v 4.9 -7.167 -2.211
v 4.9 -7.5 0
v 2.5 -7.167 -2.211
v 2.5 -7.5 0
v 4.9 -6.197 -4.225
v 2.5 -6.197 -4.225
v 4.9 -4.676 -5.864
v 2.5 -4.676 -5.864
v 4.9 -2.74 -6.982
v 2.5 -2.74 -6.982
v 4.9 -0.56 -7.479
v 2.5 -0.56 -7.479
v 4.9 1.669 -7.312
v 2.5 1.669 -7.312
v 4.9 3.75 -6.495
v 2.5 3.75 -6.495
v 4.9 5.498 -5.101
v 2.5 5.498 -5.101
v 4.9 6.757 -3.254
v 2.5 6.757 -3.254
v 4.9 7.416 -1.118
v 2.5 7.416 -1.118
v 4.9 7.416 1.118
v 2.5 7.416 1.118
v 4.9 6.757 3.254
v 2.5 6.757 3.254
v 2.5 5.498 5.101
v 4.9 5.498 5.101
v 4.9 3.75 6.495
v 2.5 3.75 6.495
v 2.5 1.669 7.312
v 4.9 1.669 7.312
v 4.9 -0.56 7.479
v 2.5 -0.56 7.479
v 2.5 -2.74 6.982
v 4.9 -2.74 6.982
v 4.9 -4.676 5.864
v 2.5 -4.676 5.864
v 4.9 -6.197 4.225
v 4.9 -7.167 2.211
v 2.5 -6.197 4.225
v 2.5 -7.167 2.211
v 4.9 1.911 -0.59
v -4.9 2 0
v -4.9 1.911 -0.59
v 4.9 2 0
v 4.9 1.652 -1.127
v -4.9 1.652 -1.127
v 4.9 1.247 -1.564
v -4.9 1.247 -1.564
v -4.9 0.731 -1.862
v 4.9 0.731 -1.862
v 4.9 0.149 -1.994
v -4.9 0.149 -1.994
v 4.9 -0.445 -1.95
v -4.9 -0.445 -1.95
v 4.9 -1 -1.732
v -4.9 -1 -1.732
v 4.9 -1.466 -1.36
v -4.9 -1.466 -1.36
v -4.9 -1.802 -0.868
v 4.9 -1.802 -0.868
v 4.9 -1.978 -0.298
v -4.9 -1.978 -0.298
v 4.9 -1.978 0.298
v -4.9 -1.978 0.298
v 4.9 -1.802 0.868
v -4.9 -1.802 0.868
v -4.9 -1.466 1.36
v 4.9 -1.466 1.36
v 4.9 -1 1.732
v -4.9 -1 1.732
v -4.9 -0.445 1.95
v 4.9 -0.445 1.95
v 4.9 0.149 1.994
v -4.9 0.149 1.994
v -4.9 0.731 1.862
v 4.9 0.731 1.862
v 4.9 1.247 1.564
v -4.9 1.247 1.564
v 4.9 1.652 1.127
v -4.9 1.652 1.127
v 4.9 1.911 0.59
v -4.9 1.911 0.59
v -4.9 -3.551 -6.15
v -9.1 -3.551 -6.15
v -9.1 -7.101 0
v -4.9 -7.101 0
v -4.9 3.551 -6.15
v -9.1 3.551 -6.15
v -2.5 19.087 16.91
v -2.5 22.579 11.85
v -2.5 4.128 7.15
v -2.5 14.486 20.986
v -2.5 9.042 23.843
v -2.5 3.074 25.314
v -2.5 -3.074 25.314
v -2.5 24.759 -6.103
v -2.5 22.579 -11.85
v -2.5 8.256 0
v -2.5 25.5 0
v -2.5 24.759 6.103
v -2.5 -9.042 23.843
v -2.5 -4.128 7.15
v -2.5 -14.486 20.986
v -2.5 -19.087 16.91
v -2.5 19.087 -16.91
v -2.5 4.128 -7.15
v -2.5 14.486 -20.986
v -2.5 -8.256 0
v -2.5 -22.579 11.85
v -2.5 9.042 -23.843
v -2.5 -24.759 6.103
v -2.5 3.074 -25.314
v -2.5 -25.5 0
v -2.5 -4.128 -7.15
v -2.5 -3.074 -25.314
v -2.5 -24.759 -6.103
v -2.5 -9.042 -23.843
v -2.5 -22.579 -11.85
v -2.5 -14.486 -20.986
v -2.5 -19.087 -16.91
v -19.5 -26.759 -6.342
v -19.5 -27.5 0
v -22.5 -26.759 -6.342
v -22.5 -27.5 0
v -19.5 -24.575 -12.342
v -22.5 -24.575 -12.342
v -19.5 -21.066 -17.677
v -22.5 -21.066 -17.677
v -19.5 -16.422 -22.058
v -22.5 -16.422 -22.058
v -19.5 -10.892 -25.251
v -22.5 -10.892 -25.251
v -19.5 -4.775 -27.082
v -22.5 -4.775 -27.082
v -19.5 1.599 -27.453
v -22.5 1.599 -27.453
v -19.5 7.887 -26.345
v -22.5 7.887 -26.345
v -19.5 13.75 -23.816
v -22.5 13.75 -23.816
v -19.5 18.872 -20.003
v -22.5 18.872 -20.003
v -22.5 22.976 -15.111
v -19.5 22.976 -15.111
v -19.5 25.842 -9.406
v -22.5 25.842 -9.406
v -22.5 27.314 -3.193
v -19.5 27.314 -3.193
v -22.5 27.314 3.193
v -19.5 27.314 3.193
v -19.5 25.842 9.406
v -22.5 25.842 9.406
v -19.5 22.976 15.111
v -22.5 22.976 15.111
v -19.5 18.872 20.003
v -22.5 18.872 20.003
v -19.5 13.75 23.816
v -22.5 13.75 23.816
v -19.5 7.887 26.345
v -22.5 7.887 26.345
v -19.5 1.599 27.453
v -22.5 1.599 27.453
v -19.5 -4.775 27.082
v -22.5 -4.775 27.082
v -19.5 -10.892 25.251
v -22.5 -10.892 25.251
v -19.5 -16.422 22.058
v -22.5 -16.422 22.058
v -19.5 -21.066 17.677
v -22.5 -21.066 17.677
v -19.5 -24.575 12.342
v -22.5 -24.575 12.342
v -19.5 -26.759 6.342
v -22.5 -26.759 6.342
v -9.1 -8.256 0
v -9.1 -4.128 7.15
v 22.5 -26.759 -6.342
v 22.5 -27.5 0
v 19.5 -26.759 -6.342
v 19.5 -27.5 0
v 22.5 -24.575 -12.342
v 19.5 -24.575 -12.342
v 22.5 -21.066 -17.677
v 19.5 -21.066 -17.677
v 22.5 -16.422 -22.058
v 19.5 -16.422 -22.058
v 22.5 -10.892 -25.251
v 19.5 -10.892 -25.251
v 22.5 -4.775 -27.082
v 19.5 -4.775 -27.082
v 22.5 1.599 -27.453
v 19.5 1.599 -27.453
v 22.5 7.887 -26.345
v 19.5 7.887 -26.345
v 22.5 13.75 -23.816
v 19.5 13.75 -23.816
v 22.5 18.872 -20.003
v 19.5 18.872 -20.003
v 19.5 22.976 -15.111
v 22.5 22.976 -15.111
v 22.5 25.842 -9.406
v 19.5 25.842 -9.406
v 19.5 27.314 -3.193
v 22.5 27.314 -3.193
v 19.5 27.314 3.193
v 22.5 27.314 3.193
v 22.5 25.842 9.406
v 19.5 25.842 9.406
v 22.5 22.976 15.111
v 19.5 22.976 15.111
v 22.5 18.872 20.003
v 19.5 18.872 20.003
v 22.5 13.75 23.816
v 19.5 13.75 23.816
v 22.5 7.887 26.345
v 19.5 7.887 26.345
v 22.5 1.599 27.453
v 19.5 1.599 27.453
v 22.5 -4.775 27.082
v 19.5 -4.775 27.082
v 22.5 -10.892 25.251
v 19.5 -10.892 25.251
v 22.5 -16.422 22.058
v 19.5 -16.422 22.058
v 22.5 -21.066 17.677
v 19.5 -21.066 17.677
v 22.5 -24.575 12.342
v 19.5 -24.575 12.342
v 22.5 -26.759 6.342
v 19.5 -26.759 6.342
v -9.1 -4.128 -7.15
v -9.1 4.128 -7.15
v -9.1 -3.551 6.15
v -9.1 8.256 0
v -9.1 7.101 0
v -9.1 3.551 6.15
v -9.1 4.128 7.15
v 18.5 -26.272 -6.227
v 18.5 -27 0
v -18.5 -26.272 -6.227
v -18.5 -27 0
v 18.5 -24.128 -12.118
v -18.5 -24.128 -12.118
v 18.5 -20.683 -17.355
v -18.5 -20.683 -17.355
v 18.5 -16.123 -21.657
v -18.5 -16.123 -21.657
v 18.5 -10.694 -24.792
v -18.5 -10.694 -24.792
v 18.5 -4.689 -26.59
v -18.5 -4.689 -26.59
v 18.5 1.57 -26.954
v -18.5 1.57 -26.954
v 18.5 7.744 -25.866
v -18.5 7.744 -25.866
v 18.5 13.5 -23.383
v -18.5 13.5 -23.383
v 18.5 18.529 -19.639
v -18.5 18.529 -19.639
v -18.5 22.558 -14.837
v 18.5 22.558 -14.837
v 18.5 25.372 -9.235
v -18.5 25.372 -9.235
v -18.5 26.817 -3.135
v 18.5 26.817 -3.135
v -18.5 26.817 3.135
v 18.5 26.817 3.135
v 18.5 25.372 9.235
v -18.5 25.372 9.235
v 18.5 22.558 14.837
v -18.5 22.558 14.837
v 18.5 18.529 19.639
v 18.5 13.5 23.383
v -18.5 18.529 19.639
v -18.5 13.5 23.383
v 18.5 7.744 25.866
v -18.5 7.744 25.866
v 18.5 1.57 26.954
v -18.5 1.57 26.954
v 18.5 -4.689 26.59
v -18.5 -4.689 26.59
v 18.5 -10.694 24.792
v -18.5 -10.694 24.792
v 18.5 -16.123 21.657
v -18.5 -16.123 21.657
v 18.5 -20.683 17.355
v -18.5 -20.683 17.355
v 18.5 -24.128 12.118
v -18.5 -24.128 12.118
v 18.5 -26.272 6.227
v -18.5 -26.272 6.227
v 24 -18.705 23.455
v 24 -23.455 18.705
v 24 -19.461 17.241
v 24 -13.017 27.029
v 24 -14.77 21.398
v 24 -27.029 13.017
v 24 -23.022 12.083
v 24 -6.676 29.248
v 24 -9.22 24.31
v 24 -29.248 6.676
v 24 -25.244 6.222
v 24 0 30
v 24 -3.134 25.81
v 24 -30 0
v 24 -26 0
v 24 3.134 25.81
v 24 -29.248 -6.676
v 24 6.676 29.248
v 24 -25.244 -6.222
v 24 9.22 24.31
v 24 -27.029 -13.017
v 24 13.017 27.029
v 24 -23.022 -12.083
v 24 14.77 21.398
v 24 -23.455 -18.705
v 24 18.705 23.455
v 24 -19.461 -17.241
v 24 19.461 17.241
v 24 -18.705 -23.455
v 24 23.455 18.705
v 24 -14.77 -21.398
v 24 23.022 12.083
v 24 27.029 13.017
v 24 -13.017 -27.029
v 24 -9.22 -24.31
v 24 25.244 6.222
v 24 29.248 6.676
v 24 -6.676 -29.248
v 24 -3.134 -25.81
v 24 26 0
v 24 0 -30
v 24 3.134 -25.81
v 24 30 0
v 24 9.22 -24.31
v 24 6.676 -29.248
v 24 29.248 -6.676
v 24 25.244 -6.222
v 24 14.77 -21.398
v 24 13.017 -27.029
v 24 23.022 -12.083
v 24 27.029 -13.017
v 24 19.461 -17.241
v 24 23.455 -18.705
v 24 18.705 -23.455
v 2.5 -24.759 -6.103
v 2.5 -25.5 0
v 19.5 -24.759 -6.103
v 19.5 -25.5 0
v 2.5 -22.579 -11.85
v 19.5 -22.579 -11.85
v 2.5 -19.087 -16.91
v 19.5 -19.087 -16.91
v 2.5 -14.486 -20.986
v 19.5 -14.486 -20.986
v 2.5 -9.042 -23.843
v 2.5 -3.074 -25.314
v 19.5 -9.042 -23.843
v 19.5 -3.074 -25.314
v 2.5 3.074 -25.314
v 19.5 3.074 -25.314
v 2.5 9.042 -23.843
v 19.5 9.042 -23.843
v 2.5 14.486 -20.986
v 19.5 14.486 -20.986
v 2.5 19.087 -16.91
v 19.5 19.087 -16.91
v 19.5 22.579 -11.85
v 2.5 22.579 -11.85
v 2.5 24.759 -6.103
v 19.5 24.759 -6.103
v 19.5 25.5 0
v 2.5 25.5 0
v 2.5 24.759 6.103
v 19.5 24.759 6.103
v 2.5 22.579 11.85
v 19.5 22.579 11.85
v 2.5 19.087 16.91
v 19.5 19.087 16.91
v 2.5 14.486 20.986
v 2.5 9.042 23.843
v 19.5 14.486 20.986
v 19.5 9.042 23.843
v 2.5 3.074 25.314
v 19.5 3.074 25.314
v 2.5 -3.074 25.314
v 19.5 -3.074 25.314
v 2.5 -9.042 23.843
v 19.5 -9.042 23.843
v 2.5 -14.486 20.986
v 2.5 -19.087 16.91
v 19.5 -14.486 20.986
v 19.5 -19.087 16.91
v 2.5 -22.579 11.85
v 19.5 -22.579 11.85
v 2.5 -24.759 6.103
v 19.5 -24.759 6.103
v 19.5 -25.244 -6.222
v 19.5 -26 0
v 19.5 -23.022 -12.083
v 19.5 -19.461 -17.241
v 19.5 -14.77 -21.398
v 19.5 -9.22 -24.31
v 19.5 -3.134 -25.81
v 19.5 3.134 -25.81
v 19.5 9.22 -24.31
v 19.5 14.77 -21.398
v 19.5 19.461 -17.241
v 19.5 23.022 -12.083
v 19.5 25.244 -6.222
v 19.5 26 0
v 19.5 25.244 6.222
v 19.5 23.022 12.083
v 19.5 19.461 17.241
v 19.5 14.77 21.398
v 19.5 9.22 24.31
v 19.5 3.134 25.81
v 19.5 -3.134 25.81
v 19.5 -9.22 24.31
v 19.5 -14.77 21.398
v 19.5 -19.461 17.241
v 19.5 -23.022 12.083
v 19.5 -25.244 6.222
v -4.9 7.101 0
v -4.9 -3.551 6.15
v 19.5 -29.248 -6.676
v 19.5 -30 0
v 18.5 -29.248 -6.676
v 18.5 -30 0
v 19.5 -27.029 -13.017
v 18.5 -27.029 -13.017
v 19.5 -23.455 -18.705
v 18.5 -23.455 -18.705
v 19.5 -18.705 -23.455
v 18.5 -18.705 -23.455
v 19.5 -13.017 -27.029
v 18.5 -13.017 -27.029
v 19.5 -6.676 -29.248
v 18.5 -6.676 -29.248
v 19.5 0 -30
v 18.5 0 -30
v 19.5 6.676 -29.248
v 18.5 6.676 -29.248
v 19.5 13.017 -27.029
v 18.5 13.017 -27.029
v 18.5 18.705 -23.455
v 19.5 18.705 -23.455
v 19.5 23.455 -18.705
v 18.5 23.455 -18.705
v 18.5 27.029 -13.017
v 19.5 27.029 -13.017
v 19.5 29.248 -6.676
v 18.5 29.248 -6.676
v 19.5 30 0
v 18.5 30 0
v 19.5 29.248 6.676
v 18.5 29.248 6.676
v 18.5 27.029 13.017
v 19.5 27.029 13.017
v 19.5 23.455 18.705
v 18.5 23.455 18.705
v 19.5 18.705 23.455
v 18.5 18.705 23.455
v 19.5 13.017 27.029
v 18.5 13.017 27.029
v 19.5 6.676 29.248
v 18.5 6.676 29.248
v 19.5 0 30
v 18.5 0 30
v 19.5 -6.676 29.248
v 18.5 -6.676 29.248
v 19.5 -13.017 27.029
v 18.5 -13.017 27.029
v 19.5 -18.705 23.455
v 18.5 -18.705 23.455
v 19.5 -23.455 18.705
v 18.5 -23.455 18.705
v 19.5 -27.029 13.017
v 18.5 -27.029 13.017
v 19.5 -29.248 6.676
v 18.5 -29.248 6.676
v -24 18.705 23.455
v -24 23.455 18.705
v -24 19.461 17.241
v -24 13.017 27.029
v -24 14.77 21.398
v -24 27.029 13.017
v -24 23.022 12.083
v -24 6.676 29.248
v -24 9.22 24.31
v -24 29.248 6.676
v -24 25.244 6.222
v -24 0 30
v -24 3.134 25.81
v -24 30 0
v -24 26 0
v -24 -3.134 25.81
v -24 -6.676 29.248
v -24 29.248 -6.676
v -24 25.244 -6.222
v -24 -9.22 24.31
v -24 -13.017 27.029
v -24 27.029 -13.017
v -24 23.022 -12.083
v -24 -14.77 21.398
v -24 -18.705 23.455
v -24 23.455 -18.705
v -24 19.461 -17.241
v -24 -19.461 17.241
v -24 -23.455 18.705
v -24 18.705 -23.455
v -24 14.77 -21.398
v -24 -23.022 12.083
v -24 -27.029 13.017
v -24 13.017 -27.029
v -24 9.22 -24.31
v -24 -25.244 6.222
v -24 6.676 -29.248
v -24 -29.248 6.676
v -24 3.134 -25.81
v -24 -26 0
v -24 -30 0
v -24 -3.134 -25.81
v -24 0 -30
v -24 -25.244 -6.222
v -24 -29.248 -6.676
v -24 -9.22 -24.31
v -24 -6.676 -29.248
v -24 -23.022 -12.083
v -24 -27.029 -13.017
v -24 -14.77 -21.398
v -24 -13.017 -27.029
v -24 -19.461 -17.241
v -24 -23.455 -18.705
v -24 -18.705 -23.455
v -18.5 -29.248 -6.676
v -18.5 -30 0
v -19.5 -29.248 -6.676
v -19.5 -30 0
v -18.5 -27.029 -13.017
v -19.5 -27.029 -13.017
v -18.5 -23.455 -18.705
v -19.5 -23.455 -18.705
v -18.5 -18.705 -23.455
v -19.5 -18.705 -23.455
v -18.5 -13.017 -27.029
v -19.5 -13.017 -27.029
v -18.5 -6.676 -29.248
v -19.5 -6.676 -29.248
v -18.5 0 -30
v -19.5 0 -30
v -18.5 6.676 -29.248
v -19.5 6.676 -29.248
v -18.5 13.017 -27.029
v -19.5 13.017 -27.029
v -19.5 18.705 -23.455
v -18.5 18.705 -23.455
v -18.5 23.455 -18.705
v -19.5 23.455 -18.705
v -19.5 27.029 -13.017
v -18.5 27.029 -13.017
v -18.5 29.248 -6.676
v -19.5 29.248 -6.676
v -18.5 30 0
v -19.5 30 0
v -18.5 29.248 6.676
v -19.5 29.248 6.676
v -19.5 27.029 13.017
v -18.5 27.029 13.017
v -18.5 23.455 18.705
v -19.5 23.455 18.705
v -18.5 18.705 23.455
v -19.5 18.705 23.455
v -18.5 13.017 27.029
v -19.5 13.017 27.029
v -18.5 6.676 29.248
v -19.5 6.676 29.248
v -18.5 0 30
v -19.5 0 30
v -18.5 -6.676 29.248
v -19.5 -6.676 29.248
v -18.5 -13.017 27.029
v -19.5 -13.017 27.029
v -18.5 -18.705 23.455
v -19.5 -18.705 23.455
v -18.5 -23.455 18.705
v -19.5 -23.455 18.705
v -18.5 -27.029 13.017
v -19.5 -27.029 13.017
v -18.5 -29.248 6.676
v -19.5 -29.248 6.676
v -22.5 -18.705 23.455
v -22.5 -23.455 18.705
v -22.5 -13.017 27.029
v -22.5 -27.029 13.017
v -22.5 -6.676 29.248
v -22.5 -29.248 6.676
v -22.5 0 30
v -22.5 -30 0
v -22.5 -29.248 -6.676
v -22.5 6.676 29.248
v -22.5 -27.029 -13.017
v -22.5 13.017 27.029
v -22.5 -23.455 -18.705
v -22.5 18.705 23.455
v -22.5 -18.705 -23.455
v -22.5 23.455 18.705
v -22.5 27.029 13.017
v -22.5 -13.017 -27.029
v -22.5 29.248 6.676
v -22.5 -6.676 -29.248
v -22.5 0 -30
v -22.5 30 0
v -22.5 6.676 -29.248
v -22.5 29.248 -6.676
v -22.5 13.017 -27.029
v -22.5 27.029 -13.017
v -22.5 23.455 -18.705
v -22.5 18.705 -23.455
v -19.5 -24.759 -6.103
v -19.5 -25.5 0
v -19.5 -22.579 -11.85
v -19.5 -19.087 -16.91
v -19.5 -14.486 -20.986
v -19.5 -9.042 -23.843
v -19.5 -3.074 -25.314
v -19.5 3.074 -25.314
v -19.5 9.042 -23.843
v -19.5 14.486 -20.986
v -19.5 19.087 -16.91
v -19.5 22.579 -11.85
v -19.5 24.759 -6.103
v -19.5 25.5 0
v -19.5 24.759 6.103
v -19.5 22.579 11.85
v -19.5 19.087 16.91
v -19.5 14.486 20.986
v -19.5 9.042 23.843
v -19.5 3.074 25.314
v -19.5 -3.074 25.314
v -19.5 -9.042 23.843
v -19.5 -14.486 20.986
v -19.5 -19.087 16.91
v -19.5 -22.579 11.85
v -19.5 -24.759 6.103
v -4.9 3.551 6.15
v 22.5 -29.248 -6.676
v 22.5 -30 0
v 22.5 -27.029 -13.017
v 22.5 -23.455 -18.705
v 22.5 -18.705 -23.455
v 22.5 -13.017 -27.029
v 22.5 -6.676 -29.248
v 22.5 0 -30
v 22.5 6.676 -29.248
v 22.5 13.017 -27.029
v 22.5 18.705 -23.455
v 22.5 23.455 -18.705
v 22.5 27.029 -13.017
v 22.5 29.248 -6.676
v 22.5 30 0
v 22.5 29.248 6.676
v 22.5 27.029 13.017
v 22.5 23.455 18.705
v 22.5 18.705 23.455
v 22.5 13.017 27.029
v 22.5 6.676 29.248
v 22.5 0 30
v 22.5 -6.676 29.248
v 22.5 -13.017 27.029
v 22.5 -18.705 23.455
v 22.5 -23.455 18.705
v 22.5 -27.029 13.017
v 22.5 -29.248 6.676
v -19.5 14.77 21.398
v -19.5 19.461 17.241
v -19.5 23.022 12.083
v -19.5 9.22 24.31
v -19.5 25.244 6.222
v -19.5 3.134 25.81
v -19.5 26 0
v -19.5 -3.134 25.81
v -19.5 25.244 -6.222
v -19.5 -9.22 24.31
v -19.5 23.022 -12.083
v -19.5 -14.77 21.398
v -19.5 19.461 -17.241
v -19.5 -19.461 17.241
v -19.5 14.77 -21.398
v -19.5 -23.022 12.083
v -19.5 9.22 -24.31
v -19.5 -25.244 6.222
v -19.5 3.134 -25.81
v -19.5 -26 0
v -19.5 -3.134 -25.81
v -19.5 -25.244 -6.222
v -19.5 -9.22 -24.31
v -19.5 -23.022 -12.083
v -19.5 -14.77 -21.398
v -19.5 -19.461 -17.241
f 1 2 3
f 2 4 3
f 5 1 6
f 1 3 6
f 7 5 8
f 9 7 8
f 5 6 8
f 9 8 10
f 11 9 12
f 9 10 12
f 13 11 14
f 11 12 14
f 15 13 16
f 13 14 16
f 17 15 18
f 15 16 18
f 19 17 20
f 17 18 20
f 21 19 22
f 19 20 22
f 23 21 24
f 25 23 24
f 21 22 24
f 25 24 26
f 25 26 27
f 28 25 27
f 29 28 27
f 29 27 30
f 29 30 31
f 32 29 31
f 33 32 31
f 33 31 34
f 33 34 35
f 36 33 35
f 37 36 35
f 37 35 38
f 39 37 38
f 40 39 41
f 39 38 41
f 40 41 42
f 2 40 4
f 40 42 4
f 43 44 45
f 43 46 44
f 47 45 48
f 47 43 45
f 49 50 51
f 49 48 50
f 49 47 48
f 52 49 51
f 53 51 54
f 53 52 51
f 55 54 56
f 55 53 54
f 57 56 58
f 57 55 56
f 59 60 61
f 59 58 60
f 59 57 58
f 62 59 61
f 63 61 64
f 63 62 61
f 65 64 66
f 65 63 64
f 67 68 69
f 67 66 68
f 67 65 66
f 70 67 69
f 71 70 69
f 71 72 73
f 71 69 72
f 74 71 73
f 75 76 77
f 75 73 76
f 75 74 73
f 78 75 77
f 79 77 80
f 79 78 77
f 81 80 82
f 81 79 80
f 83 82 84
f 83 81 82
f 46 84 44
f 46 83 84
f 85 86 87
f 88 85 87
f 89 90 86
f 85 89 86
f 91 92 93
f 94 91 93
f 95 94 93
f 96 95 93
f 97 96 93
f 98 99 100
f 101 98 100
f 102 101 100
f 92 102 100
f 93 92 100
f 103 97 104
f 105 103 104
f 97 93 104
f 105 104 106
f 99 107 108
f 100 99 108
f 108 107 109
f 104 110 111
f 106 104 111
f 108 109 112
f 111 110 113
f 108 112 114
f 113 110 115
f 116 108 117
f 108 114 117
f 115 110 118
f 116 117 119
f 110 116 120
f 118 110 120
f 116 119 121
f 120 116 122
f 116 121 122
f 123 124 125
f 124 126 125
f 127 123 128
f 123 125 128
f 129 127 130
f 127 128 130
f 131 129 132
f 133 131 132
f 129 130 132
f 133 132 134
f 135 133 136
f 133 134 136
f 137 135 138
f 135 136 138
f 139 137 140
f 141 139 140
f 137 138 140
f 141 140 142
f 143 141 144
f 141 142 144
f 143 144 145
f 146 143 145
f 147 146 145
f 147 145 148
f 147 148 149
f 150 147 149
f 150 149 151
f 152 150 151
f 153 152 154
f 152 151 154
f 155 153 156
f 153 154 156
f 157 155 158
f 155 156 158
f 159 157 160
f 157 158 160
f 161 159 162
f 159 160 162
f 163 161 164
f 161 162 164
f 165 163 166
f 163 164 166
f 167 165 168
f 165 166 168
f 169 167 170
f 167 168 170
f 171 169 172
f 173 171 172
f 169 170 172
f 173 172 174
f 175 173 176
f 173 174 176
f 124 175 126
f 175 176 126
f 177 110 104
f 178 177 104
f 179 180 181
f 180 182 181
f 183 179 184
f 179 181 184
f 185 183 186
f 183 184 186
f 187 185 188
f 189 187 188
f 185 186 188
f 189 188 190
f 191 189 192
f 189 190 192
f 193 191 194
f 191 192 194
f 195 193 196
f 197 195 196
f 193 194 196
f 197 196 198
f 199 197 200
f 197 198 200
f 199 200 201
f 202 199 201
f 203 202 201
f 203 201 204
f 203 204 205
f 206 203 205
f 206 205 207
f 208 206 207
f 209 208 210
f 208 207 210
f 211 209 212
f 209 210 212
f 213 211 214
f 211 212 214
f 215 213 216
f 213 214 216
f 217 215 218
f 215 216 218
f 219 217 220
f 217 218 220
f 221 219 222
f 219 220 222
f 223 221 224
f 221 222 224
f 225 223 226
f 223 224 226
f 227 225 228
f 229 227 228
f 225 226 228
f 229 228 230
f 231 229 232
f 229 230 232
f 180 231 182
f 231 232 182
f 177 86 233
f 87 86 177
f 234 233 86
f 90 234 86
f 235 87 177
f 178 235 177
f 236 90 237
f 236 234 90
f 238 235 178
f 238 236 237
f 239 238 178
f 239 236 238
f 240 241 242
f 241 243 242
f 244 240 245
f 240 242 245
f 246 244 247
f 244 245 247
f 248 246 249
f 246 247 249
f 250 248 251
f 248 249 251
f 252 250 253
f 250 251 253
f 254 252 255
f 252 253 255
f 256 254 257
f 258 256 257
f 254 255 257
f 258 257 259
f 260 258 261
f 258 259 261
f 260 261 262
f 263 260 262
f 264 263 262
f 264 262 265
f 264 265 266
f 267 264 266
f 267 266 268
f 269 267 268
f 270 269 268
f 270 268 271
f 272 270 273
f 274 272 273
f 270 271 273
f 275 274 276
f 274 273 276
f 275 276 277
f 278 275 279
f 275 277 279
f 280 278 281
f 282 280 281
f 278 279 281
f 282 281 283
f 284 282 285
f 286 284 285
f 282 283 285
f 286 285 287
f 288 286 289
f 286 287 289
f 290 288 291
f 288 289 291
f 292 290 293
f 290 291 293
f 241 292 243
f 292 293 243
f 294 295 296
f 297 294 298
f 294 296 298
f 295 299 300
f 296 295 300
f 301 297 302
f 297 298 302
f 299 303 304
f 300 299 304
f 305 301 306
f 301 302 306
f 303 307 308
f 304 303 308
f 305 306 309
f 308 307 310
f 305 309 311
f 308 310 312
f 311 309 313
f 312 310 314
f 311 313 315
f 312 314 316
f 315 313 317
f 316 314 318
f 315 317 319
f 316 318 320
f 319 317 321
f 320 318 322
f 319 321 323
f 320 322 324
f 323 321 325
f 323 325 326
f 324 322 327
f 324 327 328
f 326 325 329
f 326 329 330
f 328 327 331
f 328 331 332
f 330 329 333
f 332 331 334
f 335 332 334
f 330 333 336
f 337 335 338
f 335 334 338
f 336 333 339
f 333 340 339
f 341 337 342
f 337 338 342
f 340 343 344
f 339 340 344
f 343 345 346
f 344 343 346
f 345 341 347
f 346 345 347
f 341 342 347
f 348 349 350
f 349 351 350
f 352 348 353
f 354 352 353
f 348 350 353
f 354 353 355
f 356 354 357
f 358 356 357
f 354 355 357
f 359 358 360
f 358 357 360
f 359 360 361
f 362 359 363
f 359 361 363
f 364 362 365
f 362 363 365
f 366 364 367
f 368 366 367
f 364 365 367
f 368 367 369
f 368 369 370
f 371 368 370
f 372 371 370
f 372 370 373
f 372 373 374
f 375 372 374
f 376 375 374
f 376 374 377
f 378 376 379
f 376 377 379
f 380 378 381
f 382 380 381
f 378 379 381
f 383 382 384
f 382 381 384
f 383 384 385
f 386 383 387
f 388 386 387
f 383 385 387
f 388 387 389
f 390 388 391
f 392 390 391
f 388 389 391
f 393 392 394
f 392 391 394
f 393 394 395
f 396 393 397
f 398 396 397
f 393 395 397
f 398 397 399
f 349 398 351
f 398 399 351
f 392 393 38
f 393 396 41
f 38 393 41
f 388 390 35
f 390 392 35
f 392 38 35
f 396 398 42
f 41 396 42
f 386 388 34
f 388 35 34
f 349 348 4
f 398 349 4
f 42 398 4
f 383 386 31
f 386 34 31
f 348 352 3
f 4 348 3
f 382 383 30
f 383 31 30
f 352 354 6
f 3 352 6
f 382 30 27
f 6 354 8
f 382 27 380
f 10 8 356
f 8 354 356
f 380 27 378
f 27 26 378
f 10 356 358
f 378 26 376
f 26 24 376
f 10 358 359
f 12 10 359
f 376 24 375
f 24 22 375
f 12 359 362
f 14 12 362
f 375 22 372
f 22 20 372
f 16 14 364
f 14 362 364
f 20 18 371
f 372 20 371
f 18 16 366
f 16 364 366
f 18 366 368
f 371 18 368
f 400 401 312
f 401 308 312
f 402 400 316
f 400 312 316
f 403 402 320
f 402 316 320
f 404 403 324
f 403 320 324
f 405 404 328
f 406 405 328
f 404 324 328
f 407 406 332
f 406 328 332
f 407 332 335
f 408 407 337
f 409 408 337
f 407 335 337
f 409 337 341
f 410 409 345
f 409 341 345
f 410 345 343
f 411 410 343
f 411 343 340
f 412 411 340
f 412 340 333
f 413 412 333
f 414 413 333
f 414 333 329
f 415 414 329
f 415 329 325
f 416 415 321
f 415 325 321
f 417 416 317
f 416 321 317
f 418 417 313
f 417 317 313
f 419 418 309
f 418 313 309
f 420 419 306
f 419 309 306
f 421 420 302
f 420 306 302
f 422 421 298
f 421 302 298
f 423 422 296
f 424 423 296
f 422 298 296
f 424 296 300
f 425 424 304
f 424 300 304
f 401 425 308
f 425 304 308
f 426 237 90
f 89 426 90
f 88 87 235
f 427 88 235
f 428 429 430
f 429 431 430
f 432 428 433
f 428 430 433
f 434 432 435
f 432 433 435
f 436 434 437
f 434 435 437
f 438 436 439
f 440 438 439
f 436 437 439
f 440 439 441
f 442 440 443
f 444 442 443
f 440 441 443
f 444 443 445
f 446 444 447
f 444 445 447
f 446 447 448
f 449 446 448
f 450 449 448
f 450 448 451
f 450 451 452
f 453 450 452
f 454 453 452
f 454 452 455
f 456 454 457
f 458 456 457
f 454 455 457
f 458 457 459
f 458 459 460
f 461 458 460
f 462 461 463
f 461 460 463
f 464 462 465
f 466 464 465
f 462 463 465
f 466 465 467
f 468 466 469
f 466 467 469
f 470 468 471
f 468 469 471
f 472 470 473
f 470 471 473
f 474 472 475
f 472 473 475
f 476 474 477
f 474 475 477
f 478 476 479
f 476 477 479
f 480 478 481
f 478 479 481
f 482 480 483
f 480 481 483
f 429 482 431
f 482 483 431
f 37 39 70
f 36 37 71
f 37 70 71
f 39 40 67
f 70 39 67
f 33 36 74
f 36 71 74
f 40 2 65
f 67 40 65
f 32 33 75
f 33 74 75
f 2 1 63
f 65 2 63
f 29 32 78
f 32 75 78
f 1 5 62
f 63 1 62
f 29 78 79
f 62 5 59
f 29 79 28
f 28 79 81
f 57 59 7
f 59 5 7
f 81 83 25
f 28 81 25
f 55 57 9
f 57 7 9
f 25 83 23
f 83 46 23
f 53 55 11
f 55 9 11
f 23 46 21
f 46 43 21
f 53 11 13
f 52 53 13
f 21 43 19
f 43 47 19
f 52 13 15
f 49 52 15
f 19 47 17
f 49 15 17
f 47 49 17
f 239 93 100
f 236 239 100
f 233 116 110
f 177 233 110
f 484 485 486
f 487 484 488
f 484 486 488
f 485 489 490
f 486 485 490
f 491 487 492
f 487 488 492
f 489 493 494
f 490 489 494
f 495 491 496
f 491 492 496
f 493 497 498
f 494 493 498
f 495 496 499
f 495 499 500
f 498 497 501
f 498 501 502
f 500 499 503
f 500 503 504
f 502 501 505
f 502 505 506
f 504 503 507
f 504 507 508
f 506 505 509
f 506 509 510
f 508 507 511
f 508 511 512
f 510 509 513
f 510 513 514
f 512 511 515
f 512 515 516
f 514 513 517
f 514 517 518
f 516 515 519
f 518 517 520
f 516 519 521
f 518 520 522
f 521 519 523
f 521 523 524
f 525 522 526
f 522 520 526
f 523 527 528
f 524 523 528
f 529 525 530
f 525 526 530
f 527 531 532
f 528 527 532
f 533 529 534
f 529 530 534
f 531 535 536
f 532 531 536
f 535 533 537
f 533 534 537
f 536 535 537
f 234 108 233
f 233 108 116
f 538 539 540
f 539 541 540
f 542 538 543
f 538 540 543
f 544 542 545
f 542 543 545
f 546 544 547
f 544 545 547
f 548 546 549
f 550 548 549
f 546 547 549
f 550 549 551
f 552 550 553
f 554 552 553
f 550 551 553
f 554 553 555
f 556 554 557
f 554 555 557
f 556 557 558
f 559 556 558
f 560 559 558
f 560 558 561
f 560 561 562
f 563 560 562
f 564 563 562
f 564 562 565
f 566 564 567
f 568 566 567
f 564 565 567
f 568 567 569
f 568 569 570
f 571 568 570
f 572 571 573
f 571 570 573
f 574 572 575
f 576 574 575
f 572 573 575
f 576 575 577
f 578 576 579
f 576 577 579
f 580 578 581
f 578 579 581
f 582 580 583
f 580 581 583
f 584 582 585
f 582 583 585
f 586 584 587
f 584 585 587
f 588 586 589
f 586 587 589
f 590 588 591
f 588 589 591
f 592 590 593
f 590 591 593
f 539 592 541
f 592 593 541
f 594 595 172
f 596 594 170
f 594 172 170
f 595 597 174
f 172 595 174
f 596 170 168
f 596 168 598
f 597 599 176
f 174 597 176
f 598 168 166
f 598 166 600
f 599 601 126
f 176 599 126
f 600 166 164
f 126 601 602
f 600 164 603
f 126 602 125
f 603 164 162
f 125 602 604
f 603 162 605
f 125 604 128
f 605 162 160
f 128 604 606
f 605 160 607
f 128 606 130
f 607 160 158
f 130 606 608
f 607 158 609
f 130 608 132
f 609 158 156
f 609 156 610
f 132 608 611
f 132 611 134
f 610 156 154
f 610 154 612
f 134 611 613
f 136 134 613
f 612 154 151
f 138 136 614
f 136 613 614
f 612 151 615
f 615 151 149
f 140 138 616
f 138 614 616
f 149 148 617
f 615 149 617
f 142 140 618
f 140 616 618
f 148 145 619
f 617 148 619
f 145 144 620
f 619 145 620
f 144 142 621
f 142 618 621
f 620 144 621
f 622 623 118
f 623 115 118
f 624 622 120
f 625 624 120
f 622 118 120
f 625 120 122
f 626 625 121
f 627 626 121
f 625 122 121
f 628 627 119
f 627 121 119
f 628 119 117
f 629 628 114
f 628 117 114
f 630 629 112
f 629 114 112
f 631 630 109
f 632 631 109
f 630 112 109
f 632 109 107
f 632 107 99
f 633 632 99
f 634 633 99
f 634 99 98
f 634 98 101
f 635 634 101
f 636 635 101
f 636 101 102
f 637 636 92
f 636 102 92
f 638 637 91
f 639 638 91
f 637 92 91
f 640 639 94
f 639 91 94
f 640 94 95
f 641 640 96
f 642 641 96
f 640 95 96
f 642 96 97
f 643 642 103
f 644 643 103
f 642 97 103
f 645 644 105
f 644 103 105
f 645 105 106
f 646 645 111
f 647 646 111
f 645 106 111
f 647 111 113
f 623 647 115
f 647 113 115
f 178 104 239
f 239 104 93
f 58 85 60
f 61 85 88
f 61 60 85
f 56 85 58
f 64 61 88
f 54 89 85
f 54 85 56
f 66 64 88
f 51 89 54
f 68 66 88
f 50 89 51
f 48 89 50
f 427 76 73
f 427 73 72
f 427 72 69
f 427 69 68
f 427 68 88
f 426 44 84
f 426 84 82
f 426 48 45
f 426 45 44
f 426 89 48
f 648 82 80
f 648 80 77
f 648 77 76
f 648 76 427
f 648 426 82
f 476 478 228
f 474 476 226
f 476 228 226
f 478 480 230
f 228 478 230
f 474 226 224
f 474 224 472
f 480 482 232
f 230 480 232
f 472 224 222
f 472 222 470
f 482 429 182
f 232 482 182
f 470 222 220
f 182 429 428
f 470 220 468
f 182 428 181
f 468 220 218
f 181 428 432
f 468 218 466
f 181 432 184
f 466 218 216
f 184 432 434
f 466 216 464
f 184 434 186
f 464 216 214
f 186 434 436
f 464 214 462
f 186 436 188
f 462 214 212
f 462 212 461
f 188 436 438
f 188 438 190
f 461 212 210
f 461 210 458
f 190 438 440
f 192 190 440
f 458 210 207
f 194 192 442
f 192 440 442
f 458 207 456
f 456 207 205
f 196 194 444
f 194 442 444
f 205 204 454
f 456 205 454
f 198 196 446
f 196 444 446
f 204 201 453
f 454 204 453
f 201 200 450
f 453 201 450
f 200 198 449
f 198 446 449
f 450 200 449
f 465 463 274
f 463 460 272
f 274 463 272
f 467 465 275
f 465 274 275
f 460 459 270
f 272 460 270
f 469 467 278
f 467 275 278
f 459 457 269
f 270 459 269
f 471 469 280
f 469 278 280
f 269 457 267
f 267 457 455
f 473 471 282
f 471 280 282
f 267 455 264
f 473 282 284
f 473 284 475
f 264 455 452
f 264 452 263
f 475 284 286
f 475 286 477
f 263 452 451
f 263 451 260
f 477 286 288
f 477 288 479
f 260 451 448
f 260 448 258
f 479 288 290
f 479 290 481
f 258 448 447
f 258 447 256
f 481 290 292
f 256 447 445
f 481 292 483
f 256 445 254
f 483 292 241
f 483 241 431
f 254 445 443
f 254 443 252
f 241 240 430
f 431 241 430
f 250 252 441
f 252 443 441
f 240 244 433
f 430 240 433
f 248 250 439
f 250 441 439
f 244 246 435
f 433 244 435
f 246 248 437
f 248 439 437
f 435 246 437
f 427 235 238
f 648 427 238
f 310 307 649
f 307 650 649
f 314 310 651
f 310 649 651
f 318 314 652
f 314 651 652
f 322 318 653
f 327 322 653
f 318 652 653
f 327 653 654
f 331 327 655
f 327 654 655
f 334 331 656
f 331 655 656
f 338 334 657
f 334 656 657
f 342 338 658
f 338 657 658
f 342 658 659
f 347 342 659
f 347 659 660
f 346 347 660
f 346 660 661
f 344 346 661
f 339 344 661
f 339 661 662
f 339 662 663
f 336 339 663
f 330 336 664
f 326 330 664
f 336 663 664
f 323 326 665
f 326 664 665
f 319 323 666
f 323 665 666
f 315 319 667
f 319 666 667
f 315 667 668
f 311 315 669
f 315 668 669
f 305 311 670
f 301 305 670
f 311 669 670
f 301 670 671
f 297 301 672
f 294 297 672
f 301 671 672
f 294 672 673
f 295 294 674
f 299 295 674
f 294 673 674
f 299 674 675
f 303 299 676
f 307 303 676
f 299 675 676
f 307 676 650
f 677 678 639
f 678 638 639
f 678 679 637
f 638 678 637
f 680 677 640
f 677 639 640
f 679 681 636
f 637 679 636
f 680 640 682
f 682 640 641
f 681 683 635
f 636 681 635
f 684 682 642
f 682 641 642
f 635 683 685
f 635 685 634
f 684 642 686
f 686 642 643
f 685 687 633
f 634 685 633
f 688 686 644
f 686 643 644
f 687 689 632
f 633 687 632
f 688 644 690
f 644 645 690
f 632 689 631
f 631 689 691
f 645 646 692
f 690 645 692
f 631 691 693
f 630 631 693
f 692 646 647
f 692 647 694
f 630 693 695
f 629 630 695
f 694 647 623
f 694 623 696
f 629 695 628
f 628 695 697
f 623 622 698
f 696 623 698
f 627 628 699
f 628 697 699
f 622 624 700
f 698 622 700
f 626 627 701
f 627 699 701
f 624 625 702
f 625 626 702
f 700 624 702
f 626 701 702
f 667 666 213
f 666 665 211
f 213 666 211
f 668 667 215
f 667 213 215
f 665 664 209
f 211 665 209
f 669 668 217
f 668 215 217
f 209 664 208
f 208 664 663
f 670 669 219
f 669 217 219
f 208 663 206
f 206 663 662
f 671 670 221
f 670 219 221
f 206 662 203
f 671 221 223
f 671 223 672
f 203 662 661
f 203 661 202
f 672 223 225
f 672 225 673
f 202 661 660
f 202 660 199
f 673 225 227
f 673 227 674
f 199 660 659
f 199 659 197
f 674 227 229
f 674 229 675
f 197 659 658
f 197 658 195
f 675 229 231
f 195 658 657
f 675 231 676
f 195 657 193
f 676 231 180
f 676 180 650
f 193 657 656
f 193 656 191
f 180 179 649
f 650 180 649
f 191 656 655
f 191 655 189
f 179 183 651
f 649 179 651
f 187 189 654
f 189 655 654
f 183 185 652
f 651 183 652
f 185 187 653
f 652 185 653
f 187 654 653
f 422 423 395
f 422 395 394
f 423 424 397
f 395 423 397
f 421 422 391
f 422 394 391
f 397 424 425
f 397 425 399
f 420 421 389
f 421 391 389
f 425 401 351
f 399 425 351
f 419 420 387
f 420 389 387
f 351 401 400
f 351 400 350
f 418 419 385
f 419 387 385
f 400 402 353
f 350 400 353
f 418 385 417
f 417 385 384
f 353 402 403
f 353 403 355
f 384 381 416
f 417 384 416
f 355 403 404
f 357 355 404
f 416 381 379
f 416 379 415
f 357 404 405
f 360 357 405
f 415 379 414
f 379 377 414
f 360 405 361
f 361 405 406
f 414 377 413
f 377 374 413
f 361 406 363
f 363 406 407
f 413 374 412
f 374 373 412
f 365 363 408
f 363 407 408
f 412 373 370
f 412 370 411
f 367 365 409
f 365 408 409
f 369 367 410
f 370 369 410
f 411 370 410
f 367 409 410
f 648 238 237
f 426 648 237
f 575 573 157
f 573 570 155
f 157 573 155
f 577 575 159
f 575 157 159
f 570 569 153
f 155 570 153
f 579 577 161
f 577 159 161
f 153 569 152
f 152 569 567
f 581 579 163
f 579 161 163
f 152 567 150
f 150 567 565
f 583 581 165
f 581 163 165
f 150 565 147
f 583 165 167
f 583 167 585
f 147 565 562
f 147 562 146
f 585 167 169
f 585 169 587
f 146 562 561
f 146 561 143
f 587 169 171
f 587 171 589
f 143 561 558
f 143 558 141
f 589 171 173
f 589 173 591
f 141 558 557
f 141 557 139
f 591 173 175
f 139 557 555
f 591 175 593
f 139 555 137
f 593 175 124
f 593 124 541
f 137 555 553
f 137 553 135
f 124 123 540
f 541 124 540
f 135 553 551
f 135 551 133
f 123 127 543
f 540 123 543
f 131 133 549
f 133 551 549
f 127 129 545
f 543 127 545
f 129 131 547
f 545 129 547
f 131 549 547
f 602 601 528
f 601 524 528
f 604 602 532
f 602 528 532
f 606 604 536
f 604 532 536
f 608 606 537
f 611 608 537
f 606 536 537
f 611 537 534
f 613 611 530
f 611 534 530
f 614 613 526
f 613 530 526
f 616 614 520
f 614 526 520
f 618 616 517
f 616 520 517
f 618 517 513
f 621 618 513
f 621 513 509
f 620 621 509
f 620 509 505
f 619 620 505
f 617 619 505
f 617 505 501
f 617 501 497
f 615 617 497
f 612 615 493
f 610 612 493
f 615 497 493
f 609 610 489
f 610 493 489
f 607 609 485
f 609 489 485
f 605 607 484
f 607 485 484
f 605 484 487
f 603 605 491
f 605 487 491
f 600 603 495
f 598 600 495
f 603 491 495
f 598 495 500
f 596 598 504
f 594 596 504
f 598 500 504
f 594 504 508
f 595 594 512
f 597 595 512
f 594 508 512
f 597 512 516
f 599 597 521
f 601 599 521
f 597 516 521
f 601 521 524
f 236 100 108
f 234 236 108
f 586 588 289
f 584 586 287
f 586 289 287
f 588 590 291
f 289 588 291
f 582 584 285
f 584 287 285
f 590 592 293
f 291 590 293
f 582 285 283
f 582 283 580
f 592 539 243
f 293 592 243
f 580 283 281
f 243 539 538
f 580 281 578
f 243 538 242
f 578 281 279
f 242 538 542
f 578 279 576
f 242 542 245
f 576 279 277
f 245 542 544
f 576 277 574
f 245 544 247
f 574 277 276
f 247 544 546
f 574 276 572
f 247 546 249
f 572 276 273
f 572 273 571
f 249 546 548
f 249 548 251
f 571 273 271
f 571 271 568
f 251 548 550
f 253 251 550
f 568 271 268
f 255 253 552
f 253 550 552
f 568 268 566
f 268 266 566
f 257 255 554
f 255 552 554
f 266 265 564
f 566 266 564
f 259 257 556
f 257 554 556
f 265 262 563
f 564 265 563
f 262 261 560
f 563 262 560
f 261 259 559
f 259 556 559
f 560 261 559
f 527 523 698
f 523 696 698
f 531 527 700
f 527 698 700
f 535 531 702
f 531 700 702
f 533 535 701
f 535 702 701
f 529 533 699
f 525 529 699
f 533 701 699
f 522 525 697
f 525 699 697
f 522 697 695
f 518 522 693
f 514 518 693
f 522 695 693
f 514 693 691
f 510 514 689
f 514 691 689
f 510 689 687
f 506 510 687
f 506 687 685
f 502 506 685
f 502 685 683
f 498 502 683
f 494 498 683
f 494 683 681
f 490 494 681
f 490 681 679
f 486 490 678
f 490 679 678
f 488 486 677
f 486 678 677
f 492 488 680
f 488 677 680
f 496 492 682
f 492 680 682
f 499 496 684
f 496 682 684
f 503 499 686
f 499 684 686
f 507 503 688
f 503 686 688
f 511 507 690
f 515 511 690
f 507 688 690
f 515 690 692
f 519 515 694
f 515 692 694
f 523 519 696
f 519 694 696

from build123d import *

# Parameters (mm, degrees)
CORTAR_EXTRUIR1_REACH   = 53.334
CROQUIS2_R              = 2
CROQUIS3_R              = 2
SALIENTE_EXTRUIR1_DEPTH = 6.6
CORTAR_EXTRUIR2_DEPTH   = 4.2


with BuildPart() as part:
    # Croquis1 → Revolución1 (revolve)
    with BuildSketch(Plane.XY, mode=Mode.PRIVATE) as revoluci_n1_sk:
        Polygon((-2.5, 7.5), (-2.5, 0), (4.9, 0), (4.9, 7.5), (2.5, 7.5), (2.5, 25.5), (19.5, 25.5), (19.5, 26), (24, 26), (24, 30), (22.5, 30), (22.5, 27.5), (19.5, 27.5), (19.5, 30), (18.5, 30), (18.5, 27), (-18.5, 27), (-18.5, 30), (-19.5, 30), (-19.5, 27.5), (-22.5, 27.5), (-22.5, 30), (-24, 30), (-24, 26), (-19.5, 26), (-19.5, 25.5), (-2.5, 25.5), align=None)
    revolve(revoluci_n1_sk.sketch.rotate(Axis((-2.5, 0, 0), (1, 0, 0)), 180), axis=Axis((-2.5, 0, 0), (1, 0, 0)))

    # Croquis2 → Cortar-Extruir1 (cut, up to next)
    with BuildSketch(Plane(origin=(4.9, 0, 0), x_dir=(0, 0, -1), z_dir=(1, 0, 0)), mode=Mode.PRIVATE) as cortar_extruir1_sk1:
        with Locations(Location((0, 0, 0), (0, 0, 90))):
            Circle(CROQUIS2_R)
    cortar_extruir1_tool1 = extrude(cortar_extruir1_sk1.sketch, amount=-CORTAR_EXTRUIR1_REACH, mode=Mode.PRIVATE) & part.part
    add(cortar_extruir1_tool1.solids().sort_by_distance((4.9, 0, 0))[0], mode=Mode.SUBTRACT)

    # Croquis3 → Saliente-Extruir1 (add)
    with BuildSketch(Plane.ZY.offset(2.5)):
        Polygon((0, 8.256108849), (-7.15, 4.128054425), (-7.15, -4.128054425), (0, -8.256108849), (7.15, -4.128054425), (7.15, 4.128054425), align=None)
        with Locations(Location((0, 0, 0), (0, 0, 90))):
            Circle(CROQUIS3_R, mode=Mode.SUBTRACT)
    extrude(amount=SALIENTE_EXTRUIR1_DEPTH)

    # Croquis4 → Cortar-Extruir2 (cut)
    with BuildSketch(Plane.ZY.offset(9.1)):
        Polygon((6.15, 3.550704156), (0, 7.101408311), (-6.15, 3.550704156), (-6.15, -3.550704156), (0, -7.101408311), (6.15, -3.550704156), align=None)
    extrude(amount=-CORTAR_EXTRUIR2_DEPTH, mode=Mode.SUBTRACT)


solid = part.part
